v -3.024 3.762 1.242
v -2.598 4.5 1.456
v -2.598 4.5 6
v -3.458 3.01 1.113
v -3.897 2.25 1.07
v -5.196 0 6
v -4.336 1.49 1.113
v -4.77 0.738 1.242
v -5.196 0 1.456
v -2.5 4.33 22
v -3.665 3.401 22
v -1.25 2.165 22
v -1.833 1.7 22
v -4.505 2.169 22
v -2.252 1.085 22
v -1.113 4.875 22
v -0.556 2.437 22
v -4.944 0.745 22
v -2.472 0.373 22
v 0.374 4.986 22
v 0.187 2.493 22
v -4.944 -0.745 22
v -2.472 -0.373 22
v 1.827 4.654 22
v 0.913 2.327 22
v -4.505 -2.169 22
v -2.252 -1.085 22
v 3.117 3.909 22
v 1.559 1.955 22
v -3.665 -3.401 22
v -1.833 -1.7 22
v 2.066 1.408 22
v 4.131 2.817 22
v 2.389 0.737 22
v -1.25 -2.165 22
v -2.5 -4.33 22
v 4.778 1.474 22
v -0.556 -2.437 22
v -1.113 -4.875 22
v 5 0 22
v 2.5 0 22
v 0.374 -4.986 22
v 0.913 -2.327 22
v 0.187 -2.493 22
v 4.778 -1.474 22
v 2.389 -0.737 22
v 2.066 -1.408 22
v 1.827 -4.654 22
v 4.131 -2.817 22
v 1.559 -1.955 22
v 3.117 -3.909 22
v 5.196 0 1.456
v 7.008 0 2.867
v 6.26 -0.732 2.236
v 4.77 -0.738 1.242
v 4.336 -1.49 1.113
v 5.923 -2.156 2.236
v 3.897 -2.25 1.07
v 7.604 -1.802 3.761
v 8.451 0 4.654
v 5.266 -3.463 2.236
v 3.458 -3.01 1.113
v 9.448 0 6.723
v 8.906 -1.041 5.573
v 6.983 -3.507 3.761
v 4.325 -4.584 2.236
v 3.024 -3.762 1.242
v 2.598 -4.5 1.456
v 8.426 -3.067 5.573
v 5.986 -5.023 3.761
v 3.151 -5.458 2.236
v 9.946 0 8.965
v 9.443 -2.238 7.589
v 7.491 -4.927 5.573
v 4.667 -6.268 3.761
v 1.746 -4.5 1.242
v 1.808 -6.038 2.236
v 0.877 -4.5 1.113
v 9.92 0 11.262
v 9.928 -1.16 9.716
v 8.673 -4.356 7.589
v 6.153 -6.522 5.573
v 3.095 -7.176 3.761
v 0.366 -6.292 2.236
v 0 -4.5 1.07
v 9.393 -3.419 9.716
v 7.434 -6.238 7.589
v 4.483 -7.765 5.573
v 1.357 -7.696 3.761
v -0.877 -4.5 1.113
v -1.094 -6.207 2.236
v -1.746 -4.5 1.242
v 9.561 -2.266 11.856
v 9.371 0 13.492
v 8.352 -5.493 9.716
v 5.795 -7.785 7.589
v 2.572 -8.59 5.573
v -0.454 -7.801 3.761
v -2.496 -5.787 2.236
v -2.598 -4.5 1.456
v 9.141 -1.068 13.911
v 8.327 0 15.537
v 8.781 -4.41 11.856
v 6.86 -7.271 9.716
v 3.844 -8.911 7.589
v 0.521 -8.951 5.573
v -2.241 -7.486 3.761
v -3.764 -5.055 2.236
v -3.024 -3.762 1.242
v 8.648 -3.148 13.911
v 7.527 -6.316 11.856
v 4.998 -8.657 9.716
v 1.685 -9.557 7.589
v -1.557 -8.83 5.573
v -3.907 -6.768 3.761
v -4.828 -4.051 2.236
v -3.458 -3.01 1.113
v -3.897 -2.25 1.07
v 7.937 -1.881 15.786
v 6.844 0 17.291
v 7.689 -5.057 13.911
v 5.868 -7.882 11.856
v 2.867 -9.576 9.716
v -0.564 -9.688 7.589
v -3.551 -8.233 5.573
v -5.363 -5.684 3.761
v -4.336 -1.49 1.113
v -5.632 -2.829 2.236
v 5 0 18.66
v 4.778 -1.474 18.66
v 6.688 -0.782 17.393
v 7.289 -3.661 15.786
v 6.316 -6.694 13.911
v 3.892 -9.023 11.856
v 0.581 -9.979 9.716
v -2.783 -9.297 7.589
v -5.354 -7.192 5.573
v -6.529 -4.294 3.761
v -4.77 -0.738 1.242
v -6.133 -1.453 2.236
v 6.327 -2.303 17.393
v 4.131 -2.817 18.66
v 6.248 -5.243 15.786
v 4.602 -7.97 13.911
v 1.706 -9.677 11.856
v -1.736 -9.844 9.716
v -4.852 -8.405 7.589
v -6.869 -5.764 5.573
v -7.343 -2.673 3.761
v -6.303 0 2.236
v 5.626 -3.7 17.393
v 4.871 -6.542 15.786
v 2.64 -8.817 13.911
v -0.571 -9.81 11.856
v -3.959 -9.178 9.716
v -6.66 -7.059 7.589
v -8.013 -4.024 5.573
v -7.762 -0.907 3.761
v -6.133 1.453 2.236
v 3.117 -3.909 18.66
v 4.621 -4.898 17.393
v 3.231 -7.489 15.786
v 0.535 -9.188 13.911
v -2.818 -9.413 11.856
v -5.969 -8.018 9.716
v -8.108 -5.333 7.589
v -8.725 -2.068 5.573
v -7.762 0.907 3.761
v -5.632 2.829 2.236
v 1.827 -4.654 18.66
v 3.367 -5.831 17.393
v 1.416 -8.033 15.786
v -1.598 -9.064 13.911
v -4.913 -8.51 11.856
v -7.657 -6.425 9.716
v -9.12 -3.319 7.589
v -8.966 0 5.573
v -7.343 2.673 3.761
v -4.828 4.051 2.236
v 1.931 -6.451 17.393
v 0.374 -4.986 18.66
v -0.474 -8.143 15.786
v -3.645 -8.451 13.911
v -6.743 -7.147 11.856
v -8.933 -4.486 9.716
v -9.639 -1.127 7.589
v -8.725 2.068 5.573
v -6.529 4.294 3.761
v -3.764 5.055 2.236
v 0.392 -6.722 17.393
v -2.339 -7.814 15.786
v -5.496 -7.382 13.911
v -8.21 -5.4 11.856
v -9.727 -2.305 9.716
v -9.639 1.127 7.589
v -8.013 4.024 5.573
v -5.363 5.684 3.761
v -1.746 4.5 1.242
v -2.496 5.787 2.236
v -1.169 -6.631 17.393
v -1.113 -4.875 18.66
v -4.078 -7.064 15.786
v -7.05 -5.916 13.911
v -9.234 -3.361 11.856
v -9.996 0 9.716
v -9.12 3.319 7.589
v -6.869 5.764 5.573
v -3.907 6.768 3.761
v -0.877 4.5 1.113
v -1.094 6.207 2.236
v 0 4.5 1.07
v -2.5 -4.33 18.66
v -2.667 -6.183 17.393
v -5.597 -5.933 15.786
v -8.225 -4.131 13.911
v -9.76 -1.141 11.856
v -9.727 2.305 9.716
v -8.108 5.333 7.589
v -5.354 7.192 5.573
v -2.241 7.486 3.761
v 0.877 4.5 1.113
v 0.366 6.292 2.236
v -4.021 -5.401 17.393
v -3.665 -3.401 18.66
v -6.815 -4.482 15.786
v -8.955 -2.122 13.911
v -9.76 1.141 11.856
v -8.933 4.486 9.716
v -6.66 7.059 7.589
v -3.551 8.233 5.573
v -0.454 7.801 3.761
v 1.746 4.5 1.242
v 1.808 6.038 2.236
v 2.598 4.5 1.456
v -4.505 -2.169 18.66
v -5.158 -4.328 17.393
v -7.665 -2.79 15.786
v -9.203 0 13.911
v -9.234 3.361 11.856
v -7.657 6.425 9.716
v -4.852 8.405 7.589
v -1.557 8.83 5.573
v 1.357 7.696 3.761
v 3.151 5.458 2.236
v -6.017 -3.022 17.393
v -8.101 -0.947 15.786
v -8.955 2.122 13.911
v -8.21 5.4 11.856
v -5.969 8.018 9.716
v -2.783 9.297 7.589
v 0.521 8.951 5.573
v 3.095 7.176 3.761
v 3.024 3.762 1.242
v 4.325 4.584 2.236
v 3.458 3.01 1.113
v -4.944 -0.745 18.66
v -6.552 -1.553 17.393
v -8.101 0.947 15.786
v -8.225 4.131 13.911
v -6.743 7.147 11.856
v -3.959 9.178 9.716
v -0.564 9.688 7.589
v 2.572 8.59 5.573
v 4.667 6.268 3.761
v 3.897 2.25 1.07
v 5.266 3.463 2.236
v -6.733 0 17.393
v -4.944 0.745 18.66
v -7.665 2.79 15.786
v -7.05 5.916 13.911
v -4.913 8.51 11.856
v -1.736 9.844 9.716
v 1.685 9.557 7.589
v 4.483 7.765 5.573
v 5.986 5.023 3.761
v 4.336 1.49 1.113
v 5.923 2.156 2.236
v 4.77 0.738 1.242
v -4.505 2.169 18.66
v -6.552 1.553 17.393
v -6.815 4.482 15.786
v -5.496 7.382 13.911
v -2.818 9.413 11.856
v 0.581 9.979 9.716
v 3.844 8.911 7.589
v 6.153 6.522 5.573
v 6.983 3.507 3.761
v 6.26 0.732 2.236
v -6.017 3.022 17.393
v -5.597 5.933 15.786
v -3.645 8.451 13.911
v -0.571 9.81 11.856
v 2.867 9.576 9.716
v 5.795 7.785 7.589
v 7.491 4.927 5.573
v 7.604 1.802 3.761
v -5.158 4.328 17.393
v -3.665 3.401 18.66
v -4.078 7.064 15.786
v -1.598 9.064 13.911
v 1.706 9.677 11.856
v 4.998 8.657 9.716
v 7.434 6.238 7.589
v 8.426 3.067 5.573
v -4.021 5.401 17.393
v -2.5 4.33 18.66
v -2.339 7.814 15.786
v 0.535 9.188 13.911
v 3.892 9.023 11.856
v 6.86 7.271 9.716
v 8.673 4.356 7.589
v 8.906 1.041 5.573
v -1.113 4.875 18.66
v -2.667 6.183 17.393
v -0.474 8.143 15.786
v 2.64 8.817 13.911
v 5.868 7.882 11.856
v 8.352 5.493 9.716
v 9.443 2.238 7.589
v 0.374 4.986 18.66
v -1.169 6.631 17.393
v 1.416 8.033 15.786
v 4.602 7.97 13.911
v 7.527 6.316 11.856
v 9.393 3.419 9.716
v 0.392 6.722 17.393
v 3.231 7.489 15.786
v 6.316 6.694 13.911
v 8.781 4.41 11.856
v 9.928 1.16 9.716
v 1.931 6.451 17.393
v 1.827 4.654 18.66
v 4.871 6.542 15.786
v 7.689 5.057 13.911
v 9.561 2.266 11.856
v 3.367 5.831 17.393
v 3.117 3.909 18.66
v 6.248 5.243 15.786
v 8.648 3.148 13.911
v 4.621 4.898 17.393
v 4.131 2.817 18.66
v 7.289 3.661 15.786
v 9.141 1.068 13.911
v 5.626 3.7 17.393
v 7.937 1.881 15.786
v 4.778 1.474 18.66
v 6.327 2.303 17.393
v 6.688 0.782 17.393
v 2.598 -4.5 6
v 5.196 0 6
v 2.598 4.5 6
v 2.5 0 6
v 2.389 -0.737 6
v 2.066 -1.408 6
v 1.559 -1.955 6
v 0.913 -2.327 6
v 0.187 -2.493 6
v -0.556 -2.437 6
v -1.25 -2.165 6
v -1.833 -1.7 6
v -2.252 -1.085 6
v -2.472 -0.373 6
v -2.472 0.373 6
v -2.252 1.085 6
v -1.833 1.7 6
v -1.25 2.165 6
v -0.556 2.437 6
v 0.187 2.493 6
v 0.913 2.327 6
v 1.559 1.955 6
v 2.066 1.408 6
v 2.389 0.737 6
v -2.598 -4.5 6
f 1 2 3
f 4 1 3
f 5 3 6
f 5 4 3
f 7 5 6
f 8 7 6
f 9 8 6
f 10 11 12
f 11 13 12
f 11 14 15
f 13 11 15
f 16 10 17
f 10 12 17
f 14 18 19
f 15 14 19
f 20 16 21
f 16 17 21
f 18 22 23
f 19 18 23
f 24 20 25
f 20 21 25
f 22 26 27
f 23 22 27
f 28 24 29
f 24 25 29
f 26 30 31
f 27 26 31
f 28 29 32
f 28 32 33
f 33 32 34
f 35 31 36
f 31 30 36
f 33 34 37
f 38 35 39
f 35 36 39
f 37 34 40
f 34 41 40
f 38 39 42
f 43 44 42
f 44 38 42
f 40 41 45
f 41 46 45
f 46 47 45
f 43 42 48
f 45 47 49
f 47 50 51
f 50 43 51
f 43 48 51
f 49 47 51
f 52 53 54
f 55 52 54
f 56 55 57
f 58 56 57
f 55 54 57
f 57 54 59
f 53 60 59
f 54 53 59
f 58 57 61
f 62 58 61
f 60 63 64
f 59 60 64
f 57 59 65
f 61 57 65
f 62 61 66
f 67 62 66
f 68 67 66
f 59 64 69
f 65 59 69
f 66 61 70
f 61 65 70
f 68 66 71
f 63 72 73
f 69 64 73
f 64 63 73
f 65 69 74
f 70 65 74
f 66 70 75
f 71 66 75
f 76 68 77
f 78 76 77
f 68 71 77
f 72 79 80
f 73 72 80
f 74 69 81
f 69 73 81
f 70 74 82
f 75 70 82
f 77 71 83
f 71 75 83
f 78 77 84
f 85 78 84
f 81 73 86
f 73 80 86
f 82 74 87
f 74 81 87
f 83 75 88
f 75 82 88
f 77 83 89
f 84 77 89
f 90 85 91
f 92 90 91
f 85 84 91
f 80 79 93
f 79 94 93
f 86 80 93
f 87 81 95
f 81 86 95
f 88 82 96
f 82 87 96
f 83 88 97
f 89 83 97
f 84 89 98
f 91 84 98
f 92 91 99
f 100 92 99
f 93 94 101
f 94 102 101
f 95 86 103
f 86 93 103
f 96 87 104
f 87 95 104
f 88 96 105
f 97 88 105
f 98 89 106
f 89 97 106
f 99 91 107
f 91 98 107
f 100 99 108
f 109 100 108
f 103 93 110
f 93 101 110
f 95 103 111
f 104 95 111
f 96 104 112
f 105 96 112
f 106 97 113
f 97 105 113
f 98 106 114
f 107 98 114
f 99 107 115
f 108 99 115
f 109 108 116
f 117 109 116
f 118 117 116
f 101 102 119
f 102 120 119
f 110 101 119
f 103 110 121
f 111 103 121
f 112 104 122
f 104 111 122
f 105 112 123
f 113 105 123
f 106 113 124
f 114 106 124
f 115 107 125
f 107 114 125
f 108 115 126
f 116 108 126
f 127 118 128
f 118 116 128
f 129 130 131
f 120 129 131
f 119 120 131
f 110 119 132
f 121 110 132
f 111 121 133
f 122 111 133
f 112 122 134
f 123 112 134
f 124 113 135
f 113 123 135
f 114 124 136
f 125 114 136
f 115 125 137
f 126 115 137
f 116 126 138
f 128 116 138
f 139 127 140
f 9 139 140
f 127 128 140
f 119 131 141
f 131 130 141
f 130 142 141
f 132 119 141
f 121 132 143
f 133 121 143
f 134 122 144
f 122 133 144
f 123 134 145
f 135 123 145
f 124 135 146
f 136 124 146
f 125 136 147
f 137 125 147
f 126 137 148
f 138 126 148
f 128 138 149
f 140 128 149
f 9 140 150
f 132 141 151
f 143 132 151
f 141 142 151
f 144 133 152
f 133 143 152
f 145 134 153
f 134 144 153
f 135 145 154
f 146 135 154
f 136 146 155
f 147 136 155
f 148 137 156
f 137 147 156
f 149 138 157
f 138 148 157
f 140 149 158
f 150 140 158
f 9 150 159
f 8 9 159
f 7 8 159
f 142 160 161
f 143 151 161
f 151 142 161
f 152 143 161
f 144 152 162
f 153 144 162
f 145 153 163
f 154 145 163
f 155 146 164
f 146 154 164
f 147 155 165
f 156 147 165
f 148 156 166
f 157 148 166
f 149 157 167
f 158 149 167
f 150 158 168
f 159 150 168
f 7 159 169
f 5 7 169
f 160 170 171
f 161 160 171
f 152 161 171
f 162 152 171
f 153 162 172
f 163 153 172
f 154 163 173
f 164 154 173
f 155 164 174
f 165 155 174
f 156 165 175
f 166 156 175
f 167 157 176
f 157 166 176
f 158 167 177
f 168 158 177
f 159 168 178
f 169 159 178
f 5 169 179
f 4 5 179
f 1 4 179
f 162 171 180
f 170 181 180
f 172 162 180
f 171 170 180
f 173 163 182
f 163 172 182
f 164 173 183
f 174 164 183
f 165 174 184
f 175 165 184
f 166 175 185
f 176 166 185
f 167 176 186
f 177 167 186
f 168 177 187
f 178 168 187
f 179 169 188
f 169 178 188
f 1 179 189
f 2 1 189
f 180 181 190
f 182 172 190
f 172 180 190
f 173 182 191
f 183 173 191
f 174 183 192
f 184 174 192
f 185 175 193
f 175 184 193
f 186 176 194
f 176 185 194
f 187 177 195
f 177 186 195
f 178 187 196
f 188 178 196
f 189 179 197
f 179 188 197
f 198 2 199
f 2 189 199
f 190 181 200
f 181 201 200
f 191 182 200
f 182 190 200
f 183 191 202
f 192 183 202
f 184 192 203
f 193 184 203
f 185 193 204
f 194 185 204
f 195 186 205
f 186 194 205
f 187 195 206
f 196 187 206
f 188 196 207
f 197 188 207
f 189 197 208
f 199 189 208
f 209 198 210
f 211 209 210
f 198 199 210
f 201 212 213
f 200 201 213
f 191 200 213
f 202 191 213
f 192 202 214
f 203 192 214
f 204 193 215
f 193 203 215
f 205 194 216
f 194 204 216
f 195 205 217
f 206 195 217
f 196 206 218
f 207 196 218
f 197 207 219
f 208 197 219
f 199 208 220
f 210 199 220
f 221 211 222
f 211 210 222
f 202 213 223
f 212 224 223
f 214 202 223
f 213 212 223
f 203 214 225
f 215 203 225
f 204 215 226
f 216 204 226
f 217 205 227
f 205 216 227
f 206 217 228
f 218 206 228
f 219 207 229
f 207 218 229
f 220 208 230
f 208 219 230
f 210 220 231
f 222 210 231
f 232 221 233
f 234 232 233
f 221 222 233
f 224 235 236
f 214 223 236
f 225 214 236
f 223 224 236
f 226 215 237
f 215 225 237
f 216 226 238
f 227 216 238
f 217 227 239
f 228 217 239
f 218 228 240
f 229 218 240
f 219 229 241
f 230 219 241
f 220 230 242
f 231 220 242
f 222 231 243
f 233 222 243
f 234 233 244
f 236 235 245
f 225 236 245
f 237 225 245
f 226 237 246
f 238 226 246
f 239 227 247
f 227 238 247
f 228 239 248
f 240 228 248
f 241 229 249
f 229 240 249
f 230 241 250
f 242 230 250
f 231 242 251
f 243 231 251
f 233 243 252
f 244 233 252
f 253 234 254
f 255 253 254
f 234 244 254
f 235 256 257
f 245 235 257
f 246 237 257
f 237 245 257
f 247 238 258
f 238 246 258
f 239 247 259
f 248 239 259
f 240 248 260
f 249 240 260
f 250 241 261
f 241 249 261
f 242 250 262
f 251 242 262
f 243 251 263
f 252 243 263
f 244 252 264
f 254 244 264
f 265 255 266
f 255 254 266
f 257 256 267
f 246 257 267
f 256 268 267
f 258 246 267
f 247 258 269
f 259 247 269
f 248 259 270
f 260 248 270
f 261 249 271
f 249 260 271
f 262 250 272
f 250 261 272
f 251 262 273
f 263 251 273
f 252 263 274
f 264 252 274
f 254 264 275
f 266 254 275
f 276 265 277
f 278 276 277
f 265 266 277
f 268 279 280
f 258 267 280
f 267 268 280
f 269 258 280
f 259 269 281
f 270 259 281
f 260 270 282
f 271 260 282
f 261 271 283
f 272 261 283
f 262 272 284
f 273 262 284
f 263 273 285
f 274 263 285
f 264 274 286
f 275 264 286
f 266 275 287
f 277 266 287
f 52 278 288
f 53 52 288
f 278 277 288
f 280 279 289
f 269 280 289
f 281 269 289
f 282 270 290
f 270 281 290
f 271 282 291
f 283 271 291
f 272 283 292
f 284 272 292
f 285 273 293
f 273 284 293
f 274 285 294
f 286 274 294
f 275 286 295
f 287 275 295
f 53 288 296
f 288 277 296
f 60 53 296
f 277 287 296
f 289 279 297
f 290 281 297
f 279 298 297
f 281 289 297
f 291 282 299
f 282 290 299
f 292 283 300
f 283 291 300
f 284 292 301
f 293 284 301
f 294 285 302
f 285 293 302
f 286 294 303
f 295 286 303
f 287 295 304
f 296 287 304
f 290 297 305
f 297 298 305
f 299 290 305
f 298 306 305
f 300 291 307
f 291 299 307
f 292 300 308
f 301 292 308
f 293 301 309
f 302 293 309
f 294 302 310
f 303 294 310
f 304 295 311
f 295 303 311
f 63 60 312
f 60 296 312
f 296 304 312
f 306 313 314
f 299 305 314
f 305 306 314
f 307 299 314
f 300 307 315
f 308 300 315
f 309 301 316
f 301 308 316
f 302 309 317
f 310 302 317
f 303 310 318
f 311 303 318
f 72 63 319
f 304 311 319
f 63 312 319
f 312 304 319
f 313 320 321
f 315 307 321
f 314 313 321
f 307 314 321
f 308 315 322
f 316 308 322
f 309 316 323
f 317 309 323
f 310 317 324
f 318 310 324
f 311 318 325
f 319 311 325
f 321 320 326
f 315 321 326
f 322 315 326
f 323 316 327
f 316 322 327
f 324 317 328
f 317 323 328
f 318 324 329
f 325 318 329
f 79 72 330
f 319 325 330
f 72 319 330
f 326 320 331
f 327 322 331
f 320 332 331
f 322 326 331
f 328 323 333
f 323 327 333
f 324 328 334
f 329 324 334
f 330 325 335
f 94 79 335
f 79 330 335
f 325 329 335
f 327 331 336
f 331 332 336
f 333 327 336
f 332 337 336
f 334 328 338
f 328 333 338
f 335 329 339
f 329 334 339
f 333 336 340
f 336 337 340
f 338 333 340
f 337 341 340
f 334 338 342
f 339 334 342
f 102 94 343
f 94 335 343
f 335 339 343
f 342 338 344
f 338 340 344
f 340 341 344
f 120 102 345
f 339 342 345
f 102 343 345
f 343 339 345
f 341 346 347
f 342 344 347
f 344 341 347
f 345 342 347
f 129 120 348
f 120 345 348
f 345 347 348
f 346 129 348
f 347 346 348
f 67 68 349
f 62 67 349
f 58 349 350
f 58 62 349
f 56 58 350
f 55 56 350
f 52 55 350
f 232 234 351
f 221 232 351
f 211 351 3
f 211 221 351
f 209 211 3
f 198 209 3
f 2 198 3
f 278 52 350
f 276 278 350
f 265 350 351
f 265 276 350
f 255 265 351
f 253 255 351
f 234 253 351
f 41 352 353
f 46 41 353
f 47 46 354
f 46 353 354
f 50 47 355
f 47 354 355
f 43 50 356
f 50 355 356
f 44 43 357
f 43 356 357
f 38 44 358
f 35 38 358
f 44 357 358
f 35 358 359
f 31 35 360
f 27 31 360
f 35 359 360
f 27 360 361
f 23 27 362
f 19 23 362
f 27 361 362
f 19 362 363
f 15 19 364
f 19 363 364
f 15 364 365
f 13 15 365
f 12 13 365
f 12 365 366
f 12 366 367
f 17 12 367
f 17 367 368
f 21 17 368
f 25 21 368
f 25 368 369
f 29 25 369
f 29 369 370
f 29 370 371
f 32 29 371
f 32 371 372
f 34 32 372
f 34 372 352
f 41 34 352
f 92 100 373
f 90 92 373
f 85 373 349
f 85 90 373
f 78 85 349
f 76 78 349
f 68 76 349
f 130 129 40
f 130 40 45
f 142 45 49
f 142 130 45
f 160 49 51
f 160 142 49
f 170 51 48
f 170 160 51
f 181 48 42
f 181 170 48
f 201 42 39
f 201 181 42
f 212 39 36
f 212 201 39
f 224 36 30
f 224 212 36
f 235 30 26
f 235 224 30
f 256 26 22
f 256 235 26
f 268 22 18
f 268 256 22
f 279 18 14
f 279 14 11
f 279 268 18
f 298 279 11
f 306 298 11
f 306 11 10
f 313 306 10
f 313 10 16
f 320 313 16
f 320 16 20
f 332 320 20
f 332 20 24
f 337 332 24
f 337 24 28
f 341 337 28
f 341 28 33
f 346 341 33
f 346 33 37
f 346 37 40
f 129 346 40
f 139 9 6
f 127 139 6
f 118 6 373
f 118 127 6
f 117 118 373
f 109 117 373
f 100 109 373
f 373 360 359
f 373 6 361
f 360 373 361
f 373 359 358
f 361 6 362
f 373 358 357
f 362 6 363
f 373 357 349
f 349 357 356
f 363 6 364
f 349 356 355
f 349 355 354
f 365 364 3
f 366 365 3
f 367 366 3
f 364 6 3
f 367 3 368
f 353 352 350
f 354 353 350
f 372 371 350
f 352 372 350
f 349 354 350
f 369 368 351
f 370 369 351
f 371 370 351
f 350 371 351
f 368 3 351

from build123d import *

# Parameters (mm, degrees)
F3_DEPTH = 6
F4_R     = 5
F5_DEPTH = 16
F6_R     = 2.5
F7_DEPTH = 25


with BuildPart() as f1:
    # F0 (on Front) → F1 (revolve)
    with BuildSketch(Plane.XZ):
        with BuildLine():
            ThreePointArc((0, 0), (10, 10), (0, 20))
            Line((0, 20), (0, 0))
        make_face()
    revolve(axis=Axis((0, 0, 10), (0, 0, -1)))

    # F2 (on Top) → F3 (cut)
    with BuildSketch(Plane.XY):
        Polygon((-2.598076, -4.5), (2.598076, -4.5), (5.196152, 0), (2.598076, 4.5), (-2.598076, 4.5), (-5.196152, 0), align=None)
    extrude(amount=F3_DEPTH, mode=Mode.SUBTRACT)

    # F4 (on face) → F5 (join)
    with BuildSketch(Plane(origin=(0, 0, 6), x_dir=(1, 0, 0), z_dir=(0, 0, -1))):
        Circle(F4_R)
    extrude(amount=-F5_DEPTH)

    # F6 (on face) → F7 (cut)
    with BuildSketch(Plane(origin=(0, 0, 6), x_dir=(1, 0, 0), z_dir=(0, 0, -1))):
        Circle(F6_R)
    extrude(amount=-F7_DEPTH, mode=Mode.SUBTRACT)


solid = f1.part
